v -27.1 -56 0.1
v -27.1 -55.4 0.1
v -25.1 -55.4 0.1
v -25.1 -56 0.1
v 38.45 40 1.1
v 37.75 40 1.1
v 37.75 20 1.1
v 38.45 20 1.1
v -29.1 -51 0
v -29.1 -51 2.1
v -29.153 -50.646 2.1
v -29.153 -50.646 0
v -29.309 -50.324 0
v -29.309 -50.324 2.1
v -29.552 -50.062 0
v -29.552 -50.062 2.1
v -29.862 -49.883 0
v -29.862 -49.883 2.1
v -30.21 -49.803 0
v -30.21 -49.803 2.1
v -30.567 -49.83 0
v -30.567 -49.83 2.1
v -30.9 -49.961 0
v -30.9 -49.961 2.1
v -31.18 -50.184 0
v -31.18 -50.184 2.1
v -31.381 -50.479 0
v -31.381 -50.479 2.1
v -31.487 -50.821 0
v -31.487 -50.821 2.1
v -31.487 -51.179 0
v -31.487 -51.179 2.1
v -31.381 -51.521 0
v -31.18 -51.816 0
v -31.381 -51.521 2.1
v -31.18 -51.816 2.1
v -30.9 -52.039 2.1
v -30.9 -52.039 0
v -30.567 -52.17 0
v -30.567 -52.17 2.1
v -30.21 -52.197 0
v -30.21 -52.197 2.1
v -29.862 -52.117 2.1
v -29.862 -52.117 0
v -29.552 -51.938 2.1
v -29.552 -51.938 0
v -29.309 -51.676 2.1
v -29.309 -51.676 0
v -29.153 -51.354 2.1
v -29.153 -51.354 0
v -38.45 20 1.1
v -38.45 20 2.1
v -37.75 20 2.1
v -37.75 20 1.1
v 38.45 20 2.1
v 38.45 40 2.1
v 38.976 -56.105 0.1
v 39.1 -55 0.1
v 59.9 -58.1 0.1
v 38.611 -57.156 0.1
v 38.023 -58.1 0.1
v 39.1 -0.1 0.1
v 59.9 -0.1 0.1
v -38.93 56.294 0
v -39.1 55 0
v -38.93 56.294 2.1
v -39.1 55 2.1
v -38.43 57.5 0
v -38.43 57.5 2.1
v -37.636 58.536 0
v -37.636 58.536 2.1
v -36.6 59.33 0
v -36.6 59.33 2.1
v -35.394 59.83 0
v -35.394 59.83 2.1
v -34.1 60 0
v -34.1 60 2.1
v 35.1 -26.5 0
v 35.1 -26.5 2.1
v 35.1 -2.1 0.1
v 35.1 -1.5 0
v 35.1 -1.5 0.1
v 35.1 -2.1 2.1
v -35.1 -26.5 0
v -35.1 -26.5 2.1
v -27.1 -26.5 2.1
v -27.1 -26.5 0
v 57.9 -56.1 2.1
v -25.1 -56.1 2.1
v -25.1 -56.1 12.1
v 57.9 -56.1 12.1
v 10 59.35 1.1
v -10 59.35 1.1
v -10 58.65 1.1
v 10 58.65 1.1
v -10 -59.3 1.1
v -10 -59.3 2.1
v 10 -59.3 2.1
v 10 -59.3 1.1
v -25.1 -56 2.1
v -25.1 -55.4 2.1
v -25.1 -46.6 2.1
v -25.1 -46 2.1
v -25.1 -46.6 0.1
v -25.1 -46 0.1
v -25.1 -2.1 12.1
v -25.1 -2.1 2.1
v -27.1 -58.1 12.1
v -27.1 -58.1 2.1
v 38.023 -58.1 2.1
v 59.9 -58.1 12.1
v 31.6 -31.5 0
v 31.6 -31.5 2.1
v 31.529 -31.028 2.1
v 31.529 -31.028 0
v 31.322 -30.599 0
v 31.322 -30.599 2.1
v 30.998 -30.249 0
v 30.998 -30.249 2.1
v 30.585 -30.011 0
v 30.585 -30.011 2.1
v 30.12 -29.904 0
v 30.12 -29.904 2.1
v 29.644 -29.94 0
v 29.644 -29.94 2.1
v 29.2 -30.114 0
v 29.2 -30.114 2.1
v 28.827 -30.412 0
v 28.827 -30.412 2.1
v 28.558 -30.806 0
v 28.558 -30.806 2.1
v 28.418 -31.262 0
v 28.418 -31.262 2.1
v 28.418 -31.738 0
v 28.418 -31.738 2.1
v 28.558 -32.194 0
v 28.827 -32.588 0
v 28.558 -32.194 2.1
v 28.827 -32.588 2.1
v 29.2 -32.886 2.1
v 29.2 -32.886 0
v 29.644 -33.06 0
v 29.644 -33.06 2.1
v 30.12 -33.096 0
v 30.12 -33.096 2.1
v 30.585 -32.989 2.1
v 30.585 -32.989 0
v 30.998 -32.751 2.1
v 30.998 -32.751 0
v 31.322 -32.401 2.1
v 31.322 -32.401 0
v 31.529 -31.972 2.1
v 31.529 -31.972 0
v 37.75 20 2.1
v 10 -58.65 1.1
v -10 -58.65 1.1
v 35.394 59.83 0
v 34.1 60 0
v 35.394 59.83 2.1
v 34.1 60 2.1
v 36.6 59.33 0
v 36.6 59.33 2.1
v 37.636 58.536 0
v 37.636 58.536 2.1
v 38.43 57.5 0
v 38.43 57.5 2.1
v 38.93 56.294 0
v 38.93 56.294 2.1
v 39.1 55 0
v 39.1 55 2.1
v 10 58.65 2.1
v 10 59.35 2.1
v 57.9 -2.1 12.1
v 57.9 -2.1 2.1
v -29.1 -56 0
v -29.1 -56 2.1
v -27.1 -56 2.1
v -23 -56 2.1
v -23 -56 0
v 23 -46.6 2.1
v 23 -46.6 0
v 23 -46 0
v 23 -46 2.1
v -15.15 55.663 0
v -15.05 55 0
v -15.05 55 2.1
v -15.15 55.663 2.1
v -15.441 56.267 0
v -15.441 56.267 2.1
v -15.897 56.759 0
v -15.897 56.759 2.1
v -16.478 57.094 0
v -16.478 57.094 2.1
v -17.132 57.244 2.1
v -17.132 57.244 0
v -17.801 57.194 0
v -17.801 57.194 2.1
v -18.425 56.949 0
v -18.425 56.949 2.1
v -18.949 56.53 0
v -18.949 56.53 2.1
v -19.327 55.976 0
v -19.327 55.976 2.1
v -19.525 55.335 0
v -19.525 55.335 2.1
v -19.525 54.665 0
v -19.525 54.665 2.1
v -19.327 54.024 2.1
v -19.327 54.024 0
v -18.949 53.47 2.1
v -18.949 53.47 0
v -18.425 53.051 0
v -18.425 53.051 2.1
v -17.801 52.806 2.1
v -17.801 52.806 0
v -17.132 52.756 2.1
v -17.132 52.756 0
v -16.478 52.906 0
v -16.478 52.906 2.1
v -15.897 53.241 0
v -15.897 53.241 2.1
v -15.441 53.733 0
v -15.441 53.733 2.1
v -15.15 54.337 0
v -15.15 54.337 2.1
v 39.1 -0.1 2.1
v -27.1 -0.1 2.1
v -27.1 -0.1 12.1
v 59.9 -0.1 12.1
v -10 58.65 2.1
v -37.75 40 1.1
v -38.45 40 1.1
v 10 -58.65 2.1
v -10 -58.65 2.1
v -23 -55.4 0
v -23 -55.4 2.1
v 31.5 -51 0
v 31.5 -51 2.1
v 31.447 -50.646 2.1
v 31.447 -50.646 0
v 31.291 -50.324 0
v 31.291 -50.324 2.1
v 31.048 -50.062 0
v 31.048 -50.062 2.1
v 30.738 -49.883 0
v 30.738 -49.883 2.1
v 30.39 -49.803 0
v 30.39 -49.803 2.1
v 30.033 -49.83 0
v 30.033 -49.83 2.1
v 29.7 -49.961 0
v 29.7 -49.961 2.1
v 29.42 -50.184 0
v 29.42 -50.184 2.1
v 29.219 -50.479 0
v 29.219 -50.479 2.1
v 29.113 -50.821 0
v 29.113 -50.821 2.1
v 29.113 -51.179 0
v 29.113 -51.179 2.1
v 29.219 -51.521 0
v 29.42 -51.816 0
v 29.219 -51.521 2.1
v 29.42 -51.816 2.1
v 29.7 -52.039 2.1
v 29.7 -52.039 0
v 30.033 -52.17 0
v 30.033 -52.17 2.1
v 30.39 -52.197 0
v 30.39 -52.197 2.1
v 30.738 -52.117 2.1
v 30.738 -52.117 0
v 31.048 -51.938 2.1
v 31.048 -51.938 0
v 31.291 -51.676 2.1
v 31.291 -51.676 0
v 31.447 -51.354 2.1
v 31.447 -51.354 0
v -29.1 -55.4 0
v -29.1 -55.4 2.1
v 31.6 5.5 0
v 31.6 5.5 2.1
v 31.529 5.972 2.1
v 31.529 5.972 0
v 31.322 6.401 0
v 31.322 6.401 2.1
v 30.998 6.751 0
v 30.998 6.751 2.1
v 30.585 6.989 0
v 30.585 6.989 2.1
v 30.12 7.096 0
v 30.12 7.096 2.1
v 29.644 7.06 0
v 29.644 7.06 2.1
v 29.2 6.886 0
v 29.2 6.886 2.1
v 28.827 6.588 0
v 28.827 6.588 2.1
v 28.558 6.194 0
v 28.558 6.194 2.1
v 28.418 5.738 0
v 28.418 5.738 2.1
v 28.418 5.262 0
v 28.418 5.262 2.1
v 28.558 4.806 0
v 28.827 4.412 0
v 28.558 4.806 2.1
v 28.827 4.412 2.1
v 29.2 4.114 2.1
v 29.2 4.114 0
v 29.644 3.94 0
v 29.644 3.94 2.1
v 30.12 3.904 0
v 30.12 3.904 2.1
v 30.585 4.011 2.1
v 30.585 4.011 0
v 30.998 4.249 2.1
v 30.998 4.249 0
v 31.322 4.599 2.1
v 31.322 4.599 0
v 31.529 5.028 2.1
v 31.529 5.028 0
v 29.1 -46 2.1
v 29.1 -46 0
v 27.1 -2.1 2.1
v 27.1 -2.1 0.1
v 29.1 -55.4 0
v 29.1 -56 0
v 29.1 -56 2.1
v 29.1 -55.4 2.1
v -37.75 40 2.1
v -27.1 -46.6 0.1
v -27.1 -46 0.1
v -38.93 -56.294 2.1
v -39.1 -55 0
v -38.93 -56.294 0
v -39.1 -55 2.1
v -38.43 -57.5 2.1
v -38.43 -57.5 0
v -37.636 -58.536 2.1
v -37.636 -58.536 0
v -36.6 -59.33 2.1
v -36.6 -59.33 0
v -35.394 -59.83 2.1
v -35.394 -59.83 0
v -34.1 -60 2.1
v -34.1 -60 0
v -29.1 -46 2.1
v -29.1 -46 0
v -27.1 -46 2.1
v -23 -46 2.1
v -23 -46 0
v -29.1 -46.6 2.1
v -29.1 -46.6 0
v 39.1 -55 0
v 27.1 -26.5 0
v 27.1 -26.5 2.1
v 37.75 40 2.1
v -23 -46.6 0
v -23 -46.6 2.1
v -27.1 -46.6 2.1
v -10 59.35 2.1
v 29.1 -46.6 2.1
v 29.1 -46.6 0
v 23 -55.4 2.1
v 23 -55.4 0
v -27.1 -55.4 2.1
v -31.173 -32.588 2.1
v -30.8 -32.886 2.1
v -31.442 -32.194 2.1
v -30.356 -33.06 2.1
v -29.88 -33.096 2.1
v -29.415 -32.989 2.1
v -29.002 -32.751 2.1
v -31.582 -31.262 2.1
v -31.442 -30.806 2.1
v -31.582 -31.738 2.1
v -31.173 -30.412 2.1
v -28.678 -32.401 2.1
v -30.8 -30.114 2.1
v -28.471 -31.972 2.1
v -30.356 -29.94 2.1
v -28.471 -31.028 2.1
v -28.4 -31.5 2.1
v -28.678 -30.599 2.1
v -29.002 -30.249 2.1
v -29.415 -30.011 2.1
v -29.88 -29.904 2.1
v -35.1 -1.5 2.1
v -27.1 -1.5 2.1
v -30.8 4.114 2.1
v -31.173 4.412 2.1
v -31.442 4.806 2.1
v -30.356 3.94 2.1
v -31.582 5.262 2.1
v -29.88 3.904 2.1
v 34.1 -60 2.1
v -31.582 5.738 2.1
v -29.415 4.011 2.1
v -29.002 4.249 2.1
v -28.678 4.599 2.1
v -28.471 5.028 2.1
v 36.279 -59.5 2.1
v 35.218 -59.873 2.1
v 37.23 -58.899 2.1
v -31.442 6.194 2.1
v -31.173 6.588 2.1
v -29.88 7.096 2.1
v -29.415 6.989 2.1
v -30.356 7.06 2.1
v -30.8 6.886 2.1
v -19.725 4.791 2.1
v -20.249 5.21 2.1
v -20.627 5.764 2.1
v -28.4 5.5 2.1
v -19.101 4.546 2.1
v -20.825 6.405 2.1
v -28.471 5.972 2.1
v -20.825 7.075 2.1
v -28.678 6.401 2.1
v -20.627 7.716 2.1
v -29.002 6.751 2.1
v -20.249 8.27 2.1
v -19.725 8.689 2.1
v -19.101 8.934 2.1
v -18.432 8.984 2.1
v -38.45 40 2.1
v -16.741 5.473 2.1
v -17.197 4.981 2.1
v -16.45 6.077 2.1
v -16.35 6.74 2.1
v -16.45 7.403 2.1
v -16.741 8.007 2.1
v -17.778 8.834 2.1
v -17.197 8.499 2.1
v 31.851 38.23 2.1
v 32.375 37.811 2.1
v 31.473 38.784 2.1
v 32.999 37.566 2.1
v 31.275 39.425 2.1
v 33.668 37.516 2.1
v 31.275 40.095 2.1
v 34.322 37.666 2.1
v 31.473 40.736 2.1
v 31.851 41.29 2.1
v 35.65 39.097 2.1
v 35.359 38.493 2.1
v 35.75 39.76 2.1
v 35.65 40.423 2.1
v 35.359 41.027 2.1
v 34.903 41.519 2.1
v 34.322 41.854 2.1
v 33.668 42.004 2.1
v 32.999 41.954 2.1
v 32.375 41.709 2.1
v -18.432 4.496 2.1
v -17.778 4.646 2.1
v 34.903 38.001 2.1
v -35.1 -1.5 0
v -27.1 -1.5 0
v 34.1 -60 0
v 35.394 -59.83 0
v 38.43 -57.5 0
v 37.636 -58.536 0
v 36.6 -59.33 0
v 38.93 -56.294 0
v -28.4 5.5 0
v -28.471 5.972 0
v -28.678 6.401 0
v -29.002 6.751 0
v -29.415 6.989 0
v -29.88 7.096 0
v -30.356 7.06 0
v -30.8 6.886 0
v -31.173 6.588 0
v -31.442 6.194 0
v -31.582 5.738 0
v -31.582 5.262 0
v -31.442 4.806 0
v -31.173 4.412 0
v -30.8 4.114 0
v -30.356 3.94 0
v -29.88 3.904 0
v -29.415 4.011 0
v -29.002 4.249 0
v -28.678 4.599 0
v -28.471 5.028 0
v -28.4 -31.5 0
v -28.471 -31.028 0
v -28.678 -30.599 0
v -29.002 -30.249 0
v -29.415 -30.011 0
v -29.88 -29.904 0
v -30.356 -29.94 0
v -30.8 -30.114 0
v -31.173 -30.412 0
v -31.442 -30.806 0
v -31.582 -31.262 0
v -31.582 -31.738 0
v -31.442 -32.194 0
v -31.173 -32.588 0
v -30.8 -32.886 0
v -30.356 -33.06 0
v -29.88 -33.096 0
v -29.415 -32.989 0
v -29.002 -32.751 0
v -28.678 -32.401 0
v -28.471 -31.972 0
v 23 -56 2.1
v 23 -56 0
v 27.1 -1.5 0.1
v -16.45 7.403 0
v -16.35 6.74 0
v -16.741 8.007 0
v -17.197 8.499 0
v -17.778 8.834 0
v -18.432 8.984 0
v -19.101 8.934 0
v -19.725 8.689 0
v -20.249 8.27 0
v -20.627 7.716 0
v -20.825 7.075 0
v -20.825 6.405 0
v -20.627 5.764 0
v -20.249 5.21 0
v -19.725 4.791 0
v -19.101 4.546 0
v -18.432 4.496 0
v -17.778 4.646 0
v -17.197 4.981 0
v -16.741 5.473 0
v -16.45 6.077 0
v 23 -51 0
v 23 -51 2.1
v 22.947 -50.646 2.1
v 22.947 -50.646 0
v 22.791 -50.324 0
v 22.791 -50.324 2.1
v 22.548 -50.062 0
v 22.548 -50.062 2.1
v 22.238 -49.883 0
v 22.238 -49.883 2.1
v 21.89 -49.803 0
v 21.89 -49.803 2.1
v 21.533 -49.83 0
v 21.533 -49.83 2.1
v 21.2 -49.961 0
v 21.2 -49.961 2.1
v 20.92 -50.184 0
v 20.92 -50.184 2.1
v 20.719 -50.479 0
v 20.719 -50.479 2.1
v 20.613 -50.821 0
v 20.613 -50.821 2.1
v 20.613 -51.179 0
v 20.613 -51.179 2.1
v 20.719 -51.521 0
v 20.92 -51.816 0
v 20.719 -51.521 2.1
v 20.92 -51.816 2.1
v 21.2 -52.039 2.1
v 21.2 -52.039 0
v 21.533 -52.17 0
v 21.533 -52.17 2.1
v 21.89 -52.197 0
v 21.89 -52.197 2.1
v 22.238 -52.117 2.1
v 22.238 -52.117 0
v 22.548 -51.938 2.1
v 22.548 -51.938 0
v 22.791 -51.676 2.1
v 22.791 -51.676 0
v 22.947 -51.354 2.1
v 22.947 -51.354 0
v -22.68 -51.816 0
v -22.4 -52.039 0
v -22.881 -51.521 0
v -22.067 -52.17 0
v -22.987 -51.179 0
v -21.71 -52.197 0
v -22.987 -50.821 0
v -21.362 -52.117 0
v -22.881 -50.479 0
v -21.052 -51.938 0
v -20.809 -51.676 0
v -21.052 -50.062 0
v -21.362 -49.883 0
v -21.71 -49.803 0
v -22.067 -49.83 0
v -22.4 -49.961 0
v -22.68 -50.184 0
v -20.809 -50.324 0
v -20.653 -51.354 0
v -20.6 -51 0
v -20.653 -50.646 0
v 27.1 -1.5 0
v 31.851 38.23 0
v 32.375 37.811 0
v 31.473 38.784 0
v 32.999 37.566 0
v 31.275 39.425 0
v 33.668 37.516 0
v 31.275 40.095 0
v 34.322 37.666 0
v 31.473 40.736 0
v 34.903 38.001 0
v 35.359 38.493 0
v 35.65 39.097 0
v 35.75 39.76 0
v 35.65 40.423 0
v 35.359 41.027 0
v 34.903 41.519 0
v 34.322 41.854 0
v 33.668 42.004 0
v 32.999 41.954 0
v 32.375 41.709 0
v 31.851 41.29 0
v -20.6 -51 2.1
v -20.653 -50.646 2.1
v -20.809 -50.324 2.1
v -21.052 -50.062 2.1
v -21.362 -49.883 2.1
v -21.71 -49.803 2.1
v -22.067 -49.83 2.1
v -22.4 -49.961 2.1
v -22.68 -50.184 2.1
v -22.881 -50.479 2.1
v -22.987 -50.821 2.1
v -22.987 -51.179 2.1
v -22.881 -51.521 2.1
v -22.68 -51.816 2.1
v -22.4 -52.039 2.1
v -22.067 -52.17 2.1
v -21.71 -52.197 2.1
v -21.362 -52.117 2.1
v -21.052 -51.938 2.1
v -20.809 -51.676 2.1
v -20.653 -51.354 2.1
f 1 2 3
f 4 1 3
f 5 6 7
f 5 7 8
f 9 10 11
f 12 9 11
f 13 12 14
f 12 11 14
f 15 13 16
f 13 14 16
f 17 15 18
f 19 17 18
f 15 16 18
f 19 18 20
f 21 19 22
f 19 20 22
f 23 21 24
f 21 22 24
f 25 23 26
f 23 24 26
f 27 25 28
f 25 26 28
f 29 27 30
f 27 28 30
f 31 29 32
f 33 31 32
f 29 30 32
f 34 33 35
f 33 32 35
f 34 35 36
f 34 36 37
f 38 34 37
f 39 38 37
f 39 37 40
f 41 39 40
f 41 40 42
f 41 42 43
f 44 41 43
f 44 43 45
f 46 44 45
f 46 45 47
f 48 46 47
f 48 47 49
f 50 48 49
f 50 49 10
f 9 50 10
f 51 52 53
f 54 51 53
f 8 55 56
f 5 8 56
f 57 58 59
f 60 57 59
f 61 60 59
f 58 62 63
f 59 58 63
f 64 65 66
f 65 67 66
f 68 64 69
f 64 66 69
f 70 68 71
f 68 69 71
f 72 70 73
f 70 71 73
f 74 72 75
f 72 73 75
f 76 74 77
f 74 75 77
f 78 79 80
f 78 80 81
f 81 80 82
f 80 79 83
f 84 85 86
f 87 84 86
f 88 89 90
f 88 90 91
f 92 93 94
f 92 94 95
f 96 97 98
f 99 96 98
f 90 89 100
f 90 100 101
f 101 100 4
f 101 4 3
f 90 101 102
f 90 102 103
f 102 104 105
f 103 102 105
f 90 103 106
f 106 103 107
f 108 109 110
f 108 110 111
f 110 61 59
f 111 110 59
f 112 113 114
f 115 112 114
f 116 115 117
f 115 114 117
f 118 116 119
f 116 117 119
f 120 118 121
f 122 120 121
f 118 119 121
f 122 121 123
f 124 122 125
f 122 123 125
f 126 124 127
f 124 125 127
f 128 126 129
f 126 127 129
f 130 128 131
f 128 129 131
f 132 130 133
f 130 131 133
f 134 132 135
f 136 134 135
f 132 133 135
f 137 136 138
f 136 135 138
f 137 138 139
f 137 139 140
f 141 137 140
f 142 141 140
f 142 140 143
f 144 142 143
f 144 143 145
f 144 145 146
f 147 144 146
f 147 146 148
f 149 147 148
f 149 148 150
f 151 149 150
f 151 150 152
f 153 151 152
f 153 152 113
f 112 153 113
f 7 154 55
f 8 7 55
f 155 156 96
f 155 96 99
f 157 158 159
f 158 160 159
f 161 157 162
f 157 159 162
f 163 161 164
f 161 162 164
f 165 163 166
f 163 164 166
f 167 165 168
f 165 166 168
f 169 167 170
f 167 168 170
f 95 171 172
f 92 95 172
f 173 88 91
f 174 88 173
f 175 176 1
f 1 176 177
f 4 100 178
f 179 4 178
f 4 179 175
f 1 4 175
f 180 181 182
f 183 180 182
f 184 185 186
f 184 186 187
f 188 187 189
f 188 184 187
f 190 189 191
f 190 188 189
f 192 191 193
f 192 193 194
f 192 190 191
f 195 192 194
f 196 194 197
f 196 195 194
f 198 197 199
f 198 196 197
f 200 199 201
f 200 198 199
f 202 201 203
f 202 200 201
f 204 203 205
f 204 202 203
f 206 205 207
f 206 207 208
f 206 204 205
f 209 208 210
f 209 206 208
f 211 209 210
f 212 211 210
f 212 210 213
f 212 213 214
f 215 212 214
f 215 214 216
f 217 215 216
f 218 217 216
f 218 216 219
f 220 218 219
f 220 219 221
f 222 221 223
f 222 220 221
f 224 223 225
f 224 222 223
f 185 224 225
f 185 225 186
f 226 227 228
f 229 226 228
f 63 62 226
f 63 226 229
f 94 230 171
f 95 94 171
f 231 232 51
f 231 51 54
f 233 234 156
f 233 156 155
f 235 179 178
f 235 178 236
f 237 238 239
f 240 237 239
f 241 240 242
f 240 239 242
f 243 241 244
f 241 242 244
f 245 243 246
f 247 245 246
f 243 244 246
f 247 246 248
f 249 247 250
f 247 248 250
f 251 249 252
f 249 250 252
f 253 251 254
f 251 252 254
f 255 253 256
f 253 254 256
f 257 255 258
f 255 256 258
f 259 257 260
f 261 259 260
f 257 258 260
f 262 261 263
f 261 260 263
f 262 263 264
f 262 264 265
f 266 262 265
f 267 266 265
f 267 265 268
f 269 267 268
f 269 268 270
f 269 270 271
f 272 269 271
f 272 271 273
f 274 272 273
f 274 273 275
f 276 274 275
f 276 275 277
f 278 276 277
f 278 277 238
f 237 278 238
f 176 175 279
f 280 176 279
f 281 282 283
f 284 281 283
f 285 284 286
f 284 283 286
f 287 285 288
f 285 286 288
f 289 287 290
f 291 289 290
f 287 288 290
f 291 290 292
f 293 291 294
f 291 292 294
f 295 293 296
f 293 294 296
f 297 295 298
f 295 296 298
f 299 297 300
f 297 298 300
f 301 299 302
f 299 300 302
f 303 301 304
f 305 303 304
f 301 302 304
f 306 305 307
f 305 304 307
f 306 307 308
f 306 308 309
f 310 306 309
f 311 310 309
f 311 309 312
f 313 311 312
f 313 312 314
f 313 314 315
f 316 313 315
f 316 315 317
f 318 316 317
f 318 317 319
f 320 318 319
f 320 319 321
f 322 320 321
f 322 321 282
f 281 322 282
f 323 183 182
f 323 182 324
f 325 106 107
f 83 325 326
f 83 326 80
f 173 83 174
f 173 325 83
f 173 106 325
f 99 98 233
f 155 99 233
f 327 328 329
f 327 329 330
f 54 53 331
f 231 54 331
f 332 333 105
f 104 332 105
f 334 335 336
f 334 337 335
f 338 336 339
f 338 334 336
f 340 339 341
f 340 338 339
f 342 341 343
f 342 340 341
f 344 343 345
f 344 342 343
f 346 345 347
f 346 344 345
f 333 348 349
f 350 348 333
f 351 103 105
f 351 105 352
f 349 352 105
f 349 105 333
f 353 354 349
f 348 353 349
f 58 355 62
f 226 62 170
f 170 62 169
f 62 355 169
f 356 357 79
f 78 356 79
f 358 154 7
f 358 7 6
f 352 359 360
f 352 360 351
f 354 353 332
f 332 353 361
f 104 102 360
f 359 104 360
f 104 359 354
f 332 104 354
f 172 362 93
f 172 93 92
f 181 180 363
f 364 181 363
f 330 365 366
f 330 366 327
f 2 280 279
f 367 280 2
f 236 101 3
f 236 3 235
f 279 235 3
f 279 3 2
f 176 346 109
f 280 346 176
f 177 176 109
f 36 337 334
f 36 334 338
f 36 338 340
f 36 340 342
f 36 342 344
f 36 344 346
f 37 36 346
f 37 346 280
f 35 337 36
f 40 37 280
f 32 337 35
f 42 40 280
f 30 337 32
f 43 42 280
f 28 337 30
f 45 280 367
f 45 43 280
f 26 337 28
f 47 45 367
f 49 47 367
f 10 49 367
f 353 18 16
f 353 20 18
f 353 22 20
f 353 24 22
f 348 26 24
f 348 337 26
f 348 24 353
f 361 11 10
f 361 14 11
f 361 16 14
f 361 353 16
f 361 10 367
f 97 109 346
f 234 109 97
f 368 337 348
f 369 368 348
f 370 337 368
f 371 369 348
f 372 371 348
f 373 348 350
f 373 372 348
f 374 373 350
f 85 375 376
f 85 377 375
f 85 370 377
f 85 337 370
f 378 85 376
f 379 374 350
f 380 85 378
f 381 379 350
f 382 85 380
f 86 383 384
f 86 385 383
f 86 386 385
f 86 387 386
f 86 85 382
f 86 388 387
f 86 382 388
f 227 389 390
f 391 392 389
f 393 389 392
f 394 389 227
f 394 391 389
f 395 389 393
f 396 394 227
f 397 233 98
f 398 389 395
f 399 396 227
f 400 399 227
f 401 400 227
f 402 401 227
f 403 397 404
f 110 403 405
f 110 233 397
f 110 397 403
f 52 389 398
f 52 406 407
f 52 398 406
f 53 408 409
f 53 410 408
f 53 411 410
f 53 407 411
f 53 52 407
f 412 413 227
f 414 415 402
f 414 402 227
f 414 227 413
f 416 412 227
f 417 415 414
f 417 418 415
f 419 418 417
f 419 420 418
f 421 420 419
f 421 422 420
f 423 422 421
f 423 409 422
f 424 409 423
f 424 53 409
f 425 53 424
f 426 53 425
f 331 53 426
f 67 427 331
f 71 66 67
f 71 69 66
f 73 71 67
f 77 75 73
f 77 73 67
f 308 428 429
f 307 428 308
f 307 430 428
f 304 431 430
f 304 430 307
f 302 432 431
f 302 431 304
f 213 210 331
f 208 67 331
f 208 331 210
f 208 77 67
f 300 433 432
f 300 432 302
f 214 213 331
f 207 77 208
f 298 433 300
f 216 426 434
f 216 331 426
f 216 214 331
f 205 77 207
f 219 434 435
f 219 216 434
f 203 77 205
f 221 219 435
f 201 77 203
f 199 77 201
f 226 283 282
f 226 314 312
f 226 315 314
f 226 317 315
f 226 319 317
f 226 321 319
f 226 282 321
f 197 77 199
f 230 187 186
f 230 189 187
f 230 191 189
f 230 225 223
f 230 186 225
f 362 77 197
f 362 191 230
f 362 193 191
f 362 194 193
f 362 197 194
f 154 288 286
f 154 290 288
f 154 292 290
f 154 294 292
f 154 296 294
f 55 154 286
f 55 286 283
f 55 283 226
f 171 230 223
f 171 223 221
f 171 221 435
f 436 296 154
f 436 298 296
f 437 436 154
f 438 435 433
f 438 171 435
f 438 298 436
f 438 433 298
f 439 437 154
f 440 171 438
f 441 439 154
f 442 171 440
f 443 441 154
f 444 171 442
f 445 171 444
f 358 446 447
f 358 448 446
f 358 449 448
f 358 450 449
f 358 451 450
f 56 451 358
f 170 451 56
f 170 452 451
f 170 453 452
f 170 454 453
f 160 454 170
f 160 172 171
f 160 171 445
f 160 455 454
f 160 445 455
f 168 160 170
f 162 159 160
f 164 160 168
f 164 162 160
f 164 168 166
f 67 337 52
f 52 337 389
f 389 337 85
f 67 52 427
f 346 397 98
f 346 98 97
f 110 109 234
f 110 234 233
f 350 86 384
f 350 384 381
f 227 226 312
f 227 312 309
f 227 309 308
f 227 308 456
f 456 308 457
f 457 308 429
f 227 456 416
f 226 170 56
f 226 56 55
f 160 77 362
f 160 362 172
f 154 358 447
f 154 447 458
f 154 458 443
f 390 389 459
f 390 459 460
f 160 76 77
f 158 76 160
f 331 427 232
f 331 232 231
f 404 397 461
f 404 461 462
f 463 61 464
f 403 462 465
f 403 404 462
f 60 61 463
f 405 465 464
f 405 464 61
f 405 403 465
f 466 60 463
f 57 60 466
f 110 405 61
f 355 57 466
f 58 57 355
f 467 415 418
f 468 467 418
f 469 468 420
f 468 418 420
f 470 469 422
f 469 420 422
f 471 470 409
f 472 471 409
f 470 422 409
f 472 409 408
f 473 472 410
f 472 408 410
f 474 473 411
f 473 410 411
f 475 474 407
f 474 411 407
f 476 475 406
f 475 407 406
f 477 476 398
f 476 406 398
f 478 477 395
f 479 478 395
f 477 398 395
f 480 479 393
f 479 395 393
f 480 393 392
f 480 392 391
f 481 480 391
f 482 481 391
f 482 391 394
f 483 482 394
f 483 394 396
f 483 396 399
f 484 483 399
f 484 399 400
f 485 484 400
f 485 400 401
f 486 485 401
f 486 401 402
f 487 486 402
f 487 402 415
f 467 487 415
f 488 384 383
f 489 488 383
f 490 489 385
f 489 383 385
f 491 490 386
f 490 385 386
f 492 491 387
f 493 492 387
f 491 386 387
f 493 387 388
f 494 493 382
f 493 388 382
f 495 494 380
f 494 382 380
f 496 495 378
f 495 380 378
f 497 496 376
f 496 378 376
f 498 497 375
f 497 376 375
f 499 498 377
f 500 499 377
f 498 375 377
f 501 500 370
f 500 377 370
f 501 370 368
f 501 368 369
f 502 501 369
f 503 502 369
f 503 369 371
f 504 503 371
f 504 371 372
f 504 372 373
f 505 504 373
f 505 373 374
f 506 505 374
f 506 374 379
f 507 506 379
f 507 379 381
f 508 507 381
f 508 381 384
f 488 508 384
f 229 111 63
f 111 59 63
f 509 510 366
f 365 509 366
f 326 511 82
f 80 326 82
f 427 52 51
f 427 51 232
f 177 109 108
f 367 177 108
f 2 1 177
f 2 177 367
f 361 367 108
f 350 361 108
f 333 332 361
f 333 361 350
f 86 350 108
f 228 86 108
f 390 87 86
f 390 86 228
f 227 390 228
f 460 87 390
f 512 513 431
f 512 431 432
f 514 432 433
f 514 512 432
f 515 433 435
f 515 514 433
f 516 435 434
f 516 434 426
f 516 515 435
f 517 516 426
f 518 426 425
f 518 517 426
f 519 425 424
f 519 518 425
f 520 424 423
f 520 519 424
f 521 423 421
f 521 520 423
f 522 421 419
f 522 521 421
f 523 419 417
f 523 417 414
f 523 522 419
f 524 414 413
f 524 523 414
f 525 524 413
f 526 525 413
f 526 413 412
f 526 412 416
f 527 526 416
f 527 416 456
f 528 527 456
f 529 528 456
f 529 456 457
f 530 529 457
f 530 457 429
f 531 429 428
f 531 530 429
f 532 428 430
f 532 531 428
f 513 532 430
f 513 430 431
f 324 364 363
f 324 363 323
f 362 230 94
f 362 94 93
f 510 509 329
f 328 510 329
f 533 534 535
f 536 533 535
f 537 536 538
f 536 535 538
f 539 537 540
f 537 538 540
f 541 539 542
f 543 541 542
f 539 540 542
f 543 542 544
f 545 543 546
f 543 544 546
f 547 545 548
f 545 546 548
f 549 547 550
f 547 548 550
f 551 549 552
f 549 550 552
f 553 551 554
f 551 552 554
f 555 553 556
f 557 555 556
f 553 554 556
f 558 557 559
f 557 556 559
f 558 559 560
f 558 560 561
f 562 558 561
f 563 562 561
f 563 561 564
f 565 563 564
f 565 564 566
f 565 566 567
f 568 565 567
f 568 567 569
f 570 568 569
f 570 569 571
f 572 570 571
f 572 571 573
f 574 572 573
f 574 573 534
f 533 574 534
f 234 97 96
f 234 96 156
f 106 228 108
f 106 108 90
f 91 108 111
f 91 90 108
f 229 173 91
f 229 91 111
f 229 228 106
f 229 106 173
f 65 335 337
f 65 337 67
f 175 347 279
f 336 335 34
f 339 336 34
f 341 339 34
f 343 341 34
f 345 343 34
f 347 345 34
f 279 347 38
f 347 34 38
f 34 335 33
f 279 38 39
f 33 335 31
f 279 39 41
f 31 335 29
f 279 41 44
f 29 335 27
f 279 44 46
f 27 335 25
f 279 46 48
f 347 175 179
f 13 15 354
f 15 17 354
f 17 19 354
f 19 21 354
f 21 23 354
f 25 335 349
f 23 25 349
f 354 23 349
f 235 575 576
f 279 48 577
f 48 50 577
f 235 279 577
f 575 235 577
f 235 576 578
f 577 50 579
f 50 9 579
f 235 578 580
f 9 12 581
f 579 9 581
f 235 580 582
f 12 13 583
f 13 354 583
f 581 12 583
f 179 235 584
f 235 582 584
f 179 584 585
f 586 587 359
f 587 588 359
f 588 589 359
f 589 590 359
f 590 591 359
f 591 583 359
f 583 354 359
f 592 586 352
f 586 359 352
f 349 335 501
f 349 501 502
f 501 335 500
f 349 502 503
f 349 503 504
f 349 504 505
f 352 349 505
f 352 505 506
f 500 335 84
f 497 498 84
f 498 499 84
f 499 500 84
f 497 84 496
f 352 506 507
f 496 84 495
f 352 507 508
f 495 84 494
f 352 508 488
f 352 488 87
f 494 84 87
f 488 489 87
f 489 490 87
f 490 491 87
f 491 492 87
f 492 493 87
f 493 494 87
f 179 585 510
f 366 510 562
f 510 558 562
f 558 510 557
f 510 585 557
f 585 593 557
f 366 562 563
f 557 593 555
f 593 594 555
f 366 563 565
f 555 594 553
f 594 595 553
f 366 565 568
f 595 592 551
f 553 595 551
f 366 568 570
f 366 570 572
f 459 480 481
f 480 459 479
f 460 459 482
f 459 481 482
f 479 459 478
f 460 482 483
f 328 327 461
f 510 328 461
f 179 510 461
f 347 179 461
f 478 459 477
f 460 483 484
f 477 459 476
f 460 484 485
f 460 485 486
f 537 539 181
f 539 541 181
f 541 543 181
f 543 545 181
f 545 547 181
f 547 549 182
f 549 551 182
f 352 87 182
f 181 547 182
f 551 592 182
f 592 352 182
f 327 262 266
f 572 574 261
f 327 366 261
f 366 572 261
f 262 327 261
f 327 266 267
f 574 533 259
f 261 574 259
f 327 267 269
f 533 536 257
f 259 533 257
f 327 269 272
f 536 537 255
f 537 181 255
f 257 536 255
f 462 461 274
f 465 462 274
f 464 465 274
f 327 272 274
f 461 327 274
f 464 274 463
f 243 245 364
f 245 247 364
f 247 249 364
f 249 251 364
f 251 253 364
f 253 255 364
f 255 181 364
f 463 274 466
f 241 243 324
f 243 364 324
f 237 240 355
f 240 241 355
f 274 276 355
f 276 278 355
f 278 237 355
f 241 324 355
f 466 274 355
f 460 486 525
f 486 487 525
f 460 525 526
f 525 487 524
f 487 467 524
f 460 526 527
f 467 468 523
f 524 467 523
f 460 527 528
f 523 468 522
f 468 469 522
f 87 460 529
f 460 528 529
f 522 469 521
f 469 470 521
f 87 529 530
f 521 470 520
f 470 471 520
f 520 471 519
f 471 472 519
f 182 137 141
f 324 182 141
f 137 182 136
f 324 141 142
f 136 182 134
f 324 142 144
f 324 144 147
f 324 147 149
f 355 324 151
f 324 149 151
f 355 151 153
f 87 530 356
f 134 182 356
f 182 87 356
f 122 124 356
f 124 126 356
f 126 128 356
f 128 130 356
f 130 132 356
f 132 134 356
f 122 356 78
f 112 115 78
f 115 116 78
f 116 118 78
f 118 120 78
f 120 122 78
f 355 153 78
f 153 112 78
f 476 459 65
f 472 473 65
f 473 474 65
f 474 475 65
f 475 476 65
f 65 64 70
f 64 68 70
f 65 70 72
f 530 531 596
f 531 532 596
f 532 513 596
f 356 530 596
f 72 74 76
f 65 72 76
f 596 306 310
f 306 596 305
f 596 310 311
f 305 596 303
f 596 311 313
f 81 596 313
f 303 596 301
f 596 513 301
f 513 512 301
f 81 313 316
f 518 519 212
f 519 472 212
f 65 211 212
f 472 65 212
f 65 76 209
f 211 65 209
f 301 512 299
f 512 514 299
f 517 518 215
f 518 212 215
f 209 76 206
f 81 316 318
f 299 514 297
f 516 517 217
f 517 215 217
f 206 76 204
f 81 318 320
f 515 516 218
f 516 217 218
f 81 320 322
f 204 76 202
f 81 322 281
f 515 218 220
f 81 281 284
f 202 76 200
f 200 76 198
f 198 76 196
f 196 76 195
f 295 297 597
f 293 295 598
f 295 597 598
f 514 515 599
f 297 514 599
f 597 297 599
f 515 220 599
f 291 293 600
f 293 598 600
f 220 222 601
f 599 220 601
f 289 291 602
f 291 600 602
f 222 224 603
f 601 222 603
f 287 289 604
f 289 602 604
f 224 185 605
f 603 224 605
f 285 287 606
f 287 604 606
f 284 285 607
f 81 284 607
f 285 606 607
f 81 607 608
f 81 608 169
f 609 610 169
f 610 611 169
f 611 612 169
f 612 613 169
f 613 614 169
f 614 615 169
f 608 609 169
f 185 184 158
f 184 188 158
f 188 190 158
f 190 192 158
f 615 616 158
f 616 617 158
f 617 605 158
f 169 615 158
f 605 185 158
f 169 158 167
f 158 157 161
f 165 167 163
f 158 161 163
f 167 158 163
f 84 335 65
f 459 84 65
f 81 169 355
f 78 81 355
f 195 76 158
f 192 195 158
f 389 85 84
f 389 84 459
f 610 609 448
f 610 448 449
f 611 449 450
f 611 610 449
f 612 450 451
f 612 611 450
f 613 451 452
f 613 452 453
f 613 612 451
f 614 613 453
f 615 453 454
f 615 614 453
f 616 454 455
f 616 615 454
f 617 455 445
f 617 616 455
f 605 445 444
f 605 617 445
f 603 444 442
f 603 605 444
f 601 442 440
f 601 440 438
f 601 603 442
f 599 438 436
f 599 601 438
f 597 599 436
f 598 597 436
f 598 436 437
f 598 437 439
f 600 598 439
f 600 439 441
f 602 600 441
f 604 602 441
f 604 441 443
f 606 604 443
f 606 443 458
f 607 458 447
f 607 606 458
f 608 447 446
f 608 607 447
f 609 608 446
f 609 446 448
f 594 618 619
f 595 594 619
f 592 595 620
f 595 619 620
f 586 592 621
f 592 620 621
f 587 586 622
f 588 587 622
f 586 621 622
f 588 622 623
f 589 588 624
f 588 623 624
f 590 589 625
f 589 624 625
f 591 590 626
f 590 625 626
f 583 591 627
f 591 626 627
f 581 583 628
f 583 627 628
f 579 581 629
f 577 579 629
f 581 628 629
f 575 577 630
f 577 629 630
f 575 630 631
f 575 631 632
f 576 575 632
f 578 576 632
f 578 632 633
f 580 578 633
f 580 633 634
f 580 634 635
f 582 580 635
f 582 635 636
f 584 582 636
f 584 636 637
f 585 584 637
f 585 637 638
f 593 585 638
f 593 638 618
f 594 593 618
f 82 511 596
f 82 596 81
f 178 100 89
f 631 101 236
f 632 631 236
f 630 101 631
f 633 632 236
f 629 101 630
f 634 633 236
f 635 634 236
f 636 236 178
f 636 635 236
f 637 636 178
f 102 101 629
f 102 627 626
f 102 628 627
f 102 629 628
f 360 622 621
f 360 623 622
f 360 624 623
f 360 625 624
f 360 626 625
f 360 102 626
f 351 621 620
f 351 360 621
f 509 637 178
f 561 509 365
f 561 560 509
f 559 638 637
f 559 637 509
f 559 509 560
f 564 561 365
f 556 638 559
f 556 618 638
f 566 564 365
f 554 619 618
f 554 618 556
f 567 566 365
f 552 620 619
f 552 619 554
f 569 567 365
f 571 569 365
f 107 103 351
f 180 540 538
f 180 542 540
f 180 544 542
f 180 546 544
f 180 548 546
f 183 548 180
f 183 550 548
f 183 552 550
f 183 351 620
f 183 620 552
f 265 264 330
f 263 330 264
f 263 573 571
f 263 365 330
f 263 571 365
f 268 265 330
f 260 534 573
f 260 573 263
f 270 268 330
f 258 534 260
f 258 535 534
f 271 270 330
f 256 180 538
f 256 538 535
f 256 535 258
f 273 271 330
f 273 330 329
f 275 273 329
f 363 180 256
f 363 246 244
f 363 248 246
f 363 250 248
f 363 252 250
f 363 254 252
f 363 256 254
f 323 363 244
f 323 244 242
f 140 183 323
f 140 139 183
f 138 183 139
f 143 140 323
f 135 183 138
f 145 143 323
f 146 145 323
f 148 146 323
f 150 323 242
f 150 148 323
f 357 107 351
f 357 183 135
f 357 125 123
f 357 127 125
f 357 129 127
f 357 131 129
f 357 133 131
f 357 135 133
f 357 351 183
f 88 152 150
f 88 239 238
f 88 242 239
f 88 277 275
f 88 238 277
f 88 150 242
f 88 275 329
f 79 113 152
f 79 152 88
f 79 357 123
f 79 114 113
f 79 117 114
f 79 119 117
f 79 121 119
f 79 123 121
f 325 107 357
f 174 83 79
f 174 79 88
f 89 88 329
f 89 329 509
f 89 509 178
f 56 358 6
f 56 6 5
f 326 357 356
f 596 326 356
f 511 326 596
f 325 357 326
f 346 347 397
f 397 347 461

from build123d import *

# Parameters (mm, degrees)
SKETCH1_W                    = 78.2
SKETCH1_H                    = 120
SKETCH1_R                    = 2.25
BOSS_EXTRUDE1_DEPTH          = 2.1
CUT_EXTRUDE1_REACH           = 4.1
SKETCH2_R                    = 1.2
SKETCH2_W                    = 6.1
SKETCH2_H                    = 0.6
CUT_EXTRUDE3_REACH           = 4.1
SKETCH8_R                    = 1.6
SKETCH8_W                    = 8
SKETCH8_H                    = 25
FILLET2_R                    = 5
SCHIZZO2_W                   = 87
SCHIZZO2_H                   = 58
SCHIZZO2_W_2                 = 83
SCHIZZO2_H_2                 = 54
ESTRUSIONE_ESTRUSIONE1_DEPTH = 10
SCHIZZO3_W                   = 0.7
SCHIZZO3_H                   = 20
SCHIZZO3_W_2                 = 20
SCHIZZO3_H_2                 = 0.7
SCHIZZO3_H_3                 = 0.65
TAGLIO_ESTRUSIONE1_DEPTH     = 1
SCHIZZO2_3_W                 = 8
SCHIZZO2_3_H                 = 0.6
SCHIZZO2_3_W_2               = 2
ESTRUSIONE_ESTRUSIONE2_DEPTH = 2


with BuildPart() as part:
    # Sketch1 → Boss-Extrude1 (new body)
    with BuildSketch(Plane.XY):
        Rectangle(SKETCH1_W, SKETCH1_H)
        with Locations((-17.3, 55)):
            Circle(SKETCH1_R, mode=Mode.SUBTRACT)
        with Locations((33.5, 39.76)):
            Circle(SKETCH1_R, mode=Mode.SUBTRACT)
        with Locations((-18.6, 6.74)):
            Circle(SKETCH1_R, mode=Mode.SUBTRACT)
    extrude(amount=BOSS_EXTRUDE1_DEPTH)

    # Sketch2 → Cut-Extrude1 (cut, up to next)
    with BuildSketch(Plane.XY.offset(2.1), mode=Mode.PRIVATE) as cut_extrude1_sk1:
        with Locations((-30.3, -51)):
            Circle(SKETCH2_R)
    cut_extrude1_tool1 = extrude(cut_extrude1_sk1.sketch, amount=-CUT_EXTRUDE1_REACH, mode=Mode.PRIVATE) & part.part
    add(cut_extrude1_tool1.solids().sort_by_distance((-30.3, -51, 2.1))[0], mode=Mode.SUBTRACT)
    # Sketch2 → Cut-Extrude1 (cut, up to next)
    with BuildSketch(Plane.XY.offset(2.1), mode=Mode.PRIVATE) as cut_extrude1_sk2:
        with Locations((-21.8, -51)):
            Circle(SKETCH2_R)
    cut_extrude1_tool2 = extrude(cut_extrude1_sk2.sketch, amount=-CUT_EXTRUDE1_REACH, mode=Mode.PRIVATE) & part.part
    add(cut_extrude1_tool2.solids().sort_by_distance((-21.8, -51, 2.1))[0], mode=Mode.SUBTRACT)
    # Sketch2 → Cut-Extrude1 (cut, up to next)
    with BuildSketch(Plane.XY.offset(2.1), mode=Mode.PRIVATE) as cut_extrude1_sk3:
        with Locations((21.8, -51)):
            Circle(SKETCH2_R)
    cut_extrude1_tool3 = extrude(cut_extrude1_sk3.sketch, amount=-CUT_EXTRUDE1_REACH, mode=Mode.PRIVATE) & part.part
    add(cut_extrude1_tool3.solids().sort_by_distance((21.8, -51, 2.1))[0], mode=Mode.SUBTRACT)
    # Sketch2 → Cut-Extrude1 (cut, up to next)
    with BuildSketch(Plane.XY.offset(2.1), mode=Mode.PRIVATE) as cut_extrude1_sk4:
        with Locations((30.3, -51)):
            Circle(SKETCH2_R)
    cut_extrude1_tool4 = extrude(cut_extrude1_sk4.sketch, amount=-CUT_EXTRUDE1_REACH, mode=Mode.PRIVATE) & part.part
    add(cut_extrude1_tool4.solids().sort_by_distance((30.3, -51, 2.1))[0], mode=Mode.SUBTRACT)
    # Sketch2 → Cut-Extrude1 (cut, up to next)
    with BuildSketch(Plane.XY.offset(2.1), mode=Mode.PRIVATE) as cut_extrude1_sk5:
        with Locations((-26.05, -46.3)):
            Rectangle(SKETCH2_W, SKETCH2_H)
    cut_extrude1_tool5 = extrude(cut_extrude1_sk5.sketch, amount=-CUT_EXTRUDE1_REACH, mode=Mode.PRIVATE) & part.part
    add(cut_extrude1_tool5.solids().sort_by_distance((-26.05, -46.3, 2.1))[0], mode=Mode.SUBTRACT)
    # Sketch2 → Cut-Extrude1 (cut, up to next)
    with BuildSketch(Plane.XY.offset(2.1), mode=Mode.PRIVATE) as cut_extrude1_sk6:
        with Locations((-26.05, -55.7)):
            Rectangle(SKETCH2_W, SKETCH2_H)
    cut_extrude1_tool6 = extrude(cut_extrude1_sk6.sketch, amount=-CUT_EXTRUDE1_REACH, mode=Mode.PRIVATE) & part.part
    add(cut_extrude1_tool6.solids().sort_by_distance((-26.05, -55.7, 2.1))[0], mode=Mode.SUBTRACT)
    # Sketch2 → Cut-Extrude1 (cut, up to next)
    with BuildSketch(Plane.XY.offset(2.1), mode=Mode.PRIVATE) as cut_extrude1_sk7:
        with Locations((26.05, -55.7)):
            Rectangle(SKETCH2_W, SKETCH2_H)
    cut_extrude1_tool7 = extrude(cut_extrude1_sk7.sketch, amount=-CUT_EXTRUDE1_REACH, mode=Mode.PRIVATE) & part.part
    add(cut_extrude1_tool7.solids().sort_by_distance((26.05, -55.7, 2.1))[0], mode=Mode.SUBTRACT)
    # Sketch2 → Cut-Extrude1 (cut, up to next)
    with BuildSketch(Plane.XY.offset(2.1), mode=Mode.PRIVATE) as cut_extrude1_sk8:
        with Locations((26.05, -46.3)):
            Rectangle(SKETCH2_W, SKETCH2_H)
    cut_extrude1_tool8 = extrude(cut_extrude1_sk8.sketch, amount=-CUT_EXTRUDE1_REACH, mode=Mode.PRIVATE) & part.part
    add(cut_extrude1_tool8.solids().sort_by_distance((26.05, -46.3, 2.1))[0], mode=Mode.SUBTRACT)

    # Sketch8 → Cut-Extrude3 (cut, up to next)
    with BuildSketch(Plane.XY.offset(2.1), mode=Mode.PRIVATE) as cut_extrude3_sk1:
        with Locations((-30, -31.5)):
            Circle(SKETCH8_R)
    cut_extrude3_tool1 = extrude(cut_extrude3_sk1.sketch, amount=-CUT_EXTRUDE3_REACH, mode=Mode.PRIVATE) & part.part
    add(cut_extrude3_tool1.solids().sort_by_distance((-30, -31.5, 2.1))[0], mode=Mode.SUBTRACT)
    # Sketch8 → Cut-Extrude3 (cut, up to next)
    with BuildSketch(Plane.XY.offset(2.1), mode=Mode.PRIVATE) as cut_extrude3_sk2:
        with Locations((30, -31.5)):
            Circle(SKETCH8_R)
    cut_extrude3_tool2 = extrude(cut_extrude3_sk2.sketch, amount=-CUT_EXTRUDE3_REACH, mode=Mode.PRIVATE) & part.part
    add(cut_extrude3_tool2.solids().sort_by_distance((30, -31.5, 2.1))[0], mode=Mode.SUBTRACT)
    # Sketch8 → Cut-Extrude3 (cut, up to next)
    with BuildSketch(Plane.XY.offset(2.1), mode=Mode.PRIVATE) as cut_extrude3_sk3:
        with Locations((30, 5.5)):
            Circle(SKETCH8_R)
    cut_extrude3_tool3 = extrude(cut_extrude3_sk3.sketch, amount=-CUT_EXTRUDE3_REACH, mode=Mode.PRIVATE) & part.part
    add(cut_extrude3_tool3.solids().sort_by_distance((30, 5.5, 2.1))[0], mode=Mode.SUBTRACT)
    # Sketch8 → Cut-Extrude3 (cut, up to next)
    with BuildSketch(Plane.XY.offset(2.1), mode=Mode.PRIVATE) as cut_extrude3_sk4:
        with Locations((-30, 5.5)):
            Circle(SKETCH8_R)
    cut_extrude3_tool4 = extrude(cut_extrude3_sk4.sketch, amount=-CUT_EXTRUDE3_REACH, mode=Mode.PRIVATE) & part.part
    add(cut_extrude3_tool4.solids().sort_by_distance((-30, 5.5, 2.1))[0], mode=Mode.SUBTRACT)
    # Sketch8 → Cut-Extrude3 (cut, up to next)
    with BuildSketch(Plane.XY.offset(2.1), mode=Mode.PRIVATE) as cut_extrude3_sk5:
        with Locations((-31.1, -14)):
            Rectangle(SKETCH8_W, SKETCH8_H)
    cut_extrude3_tool5 = extrude(cut_extrude3_sk5.sketch, amount=-CUT_EXTRUDE3_REACH, mode=Mode.PRIVATE) & part.part
    add(cut_extrude3_tool5.solids().sort_by_distance((-31.1, -14, 2.1))[0], mode=Mode.SUBTRACT)
    # Sketch8 → Cut-Extrude3 (cut, up to next)
    with BuildSketch(Plane.XY.offset(2.1), mode=Mode.PRIVATE) as cut_extrude3_sk6:
        with Locations((31.1, -14)):
            Rectangle(SKETCH8_W, SKETCH8_H)
    cut_extrude3_tool6 = extrude(cut_extrude3_sk6.sketch, amount=-CUT_EXTRUDE3_REACH, mode=Mode.PRIVATE) & part.part
    add(cut_extrude3_tool6.solids().sort_by_distance((31.1, -14, 2.1))[0], mode=Mode.SUBTRACT)

    # Fillet2
    fillet2_edges = [part.edges().sort_by_distance(p)[0] for p in [
        (39.1, -60, 1.05),
        (-39.1, -60, 1.05),
        (-39.1, 60, 1.05),
        (39.1, 60, 1.05),
    ]]
    fillet(fillet2_edges, radius=FILLET2_R)

    # Schizzo2 → Estrusione-Estrusione1 (add)
    with BuildSketch(Plane.XY.offset(2.1)):
        with Locations((16.4, -29.1)):
            Rectangle(SCHIZZO2_W, SCHIZZO2_H)
        with Locations((16.4, -29.1)):
            Rectangle(SCHIZZO2_W_2, SCHIZZO2_H_2, mode=Mode.SUBTRACT)
    extrude(amount=ESTRUSIONE_ESTRUSIONE1_DEPTH)

    # Schizzo3 → Taglio-Estrusione1 (cut)
    with BuildSketch(Plane.XY.offset(2.1)):
        with Locations((-38.1, 30)):
            Rectangle(SCHIZZO3_W, SCHIZZO3_H)
        with Locations((38.1, 30)):
            Rectangle(SCHIZZO3_W, SCHIZZO3_H)
        with Locations((0, 59)):
            Rectangle(SCHIZZO3_W_2, SCHIZZO3_H_2)
        with Locations((0, -58.975)):
            Rectangle(SCHIZZO3_W_2, SCHIZZO3_H_3)
    extrude(amount=-TAGLIO_ESTRUSIONE1_DEPTH, mode=Mode.SUBTRACT)

    # Schizzo2<3> → Estrusione-Estrusione2 (add)
    with BuildSketch(Plane.XY.offset(2.1)):
        with Locations((31.1, -1.8)):
            Rectangle(SCHIZZO2_3_W, SCHIZZO2_3_H)
        with Locations((-26.1, -46.3)):
            Rectangle(SCHIZZO2_3_W_2, SCHIZZO2_3_H)
        with BuildLine():
            Line((39.1, -0.1), (39.1, -55))
            ThreePointArc((39.1, -55), (38.823084016, -56.640877015), (38.023009049, -58.1))
            Line((38.023009049, -58.1), (59.9, -58.1))
            Line((59.9, -58.1), (59.9, -0.1))
            Line((59.9, -0.1), (39.1, -0.1))
        make_face()
        with Locations((-26.1, -55.7)):
            Rectangle(SCHIZZO2_3_W_2, SCHIZZO2_3_H)
    extrude(amount=-ESTRUSIONE_ESTRUSIONE2_DEPTH)


solid = part.part
